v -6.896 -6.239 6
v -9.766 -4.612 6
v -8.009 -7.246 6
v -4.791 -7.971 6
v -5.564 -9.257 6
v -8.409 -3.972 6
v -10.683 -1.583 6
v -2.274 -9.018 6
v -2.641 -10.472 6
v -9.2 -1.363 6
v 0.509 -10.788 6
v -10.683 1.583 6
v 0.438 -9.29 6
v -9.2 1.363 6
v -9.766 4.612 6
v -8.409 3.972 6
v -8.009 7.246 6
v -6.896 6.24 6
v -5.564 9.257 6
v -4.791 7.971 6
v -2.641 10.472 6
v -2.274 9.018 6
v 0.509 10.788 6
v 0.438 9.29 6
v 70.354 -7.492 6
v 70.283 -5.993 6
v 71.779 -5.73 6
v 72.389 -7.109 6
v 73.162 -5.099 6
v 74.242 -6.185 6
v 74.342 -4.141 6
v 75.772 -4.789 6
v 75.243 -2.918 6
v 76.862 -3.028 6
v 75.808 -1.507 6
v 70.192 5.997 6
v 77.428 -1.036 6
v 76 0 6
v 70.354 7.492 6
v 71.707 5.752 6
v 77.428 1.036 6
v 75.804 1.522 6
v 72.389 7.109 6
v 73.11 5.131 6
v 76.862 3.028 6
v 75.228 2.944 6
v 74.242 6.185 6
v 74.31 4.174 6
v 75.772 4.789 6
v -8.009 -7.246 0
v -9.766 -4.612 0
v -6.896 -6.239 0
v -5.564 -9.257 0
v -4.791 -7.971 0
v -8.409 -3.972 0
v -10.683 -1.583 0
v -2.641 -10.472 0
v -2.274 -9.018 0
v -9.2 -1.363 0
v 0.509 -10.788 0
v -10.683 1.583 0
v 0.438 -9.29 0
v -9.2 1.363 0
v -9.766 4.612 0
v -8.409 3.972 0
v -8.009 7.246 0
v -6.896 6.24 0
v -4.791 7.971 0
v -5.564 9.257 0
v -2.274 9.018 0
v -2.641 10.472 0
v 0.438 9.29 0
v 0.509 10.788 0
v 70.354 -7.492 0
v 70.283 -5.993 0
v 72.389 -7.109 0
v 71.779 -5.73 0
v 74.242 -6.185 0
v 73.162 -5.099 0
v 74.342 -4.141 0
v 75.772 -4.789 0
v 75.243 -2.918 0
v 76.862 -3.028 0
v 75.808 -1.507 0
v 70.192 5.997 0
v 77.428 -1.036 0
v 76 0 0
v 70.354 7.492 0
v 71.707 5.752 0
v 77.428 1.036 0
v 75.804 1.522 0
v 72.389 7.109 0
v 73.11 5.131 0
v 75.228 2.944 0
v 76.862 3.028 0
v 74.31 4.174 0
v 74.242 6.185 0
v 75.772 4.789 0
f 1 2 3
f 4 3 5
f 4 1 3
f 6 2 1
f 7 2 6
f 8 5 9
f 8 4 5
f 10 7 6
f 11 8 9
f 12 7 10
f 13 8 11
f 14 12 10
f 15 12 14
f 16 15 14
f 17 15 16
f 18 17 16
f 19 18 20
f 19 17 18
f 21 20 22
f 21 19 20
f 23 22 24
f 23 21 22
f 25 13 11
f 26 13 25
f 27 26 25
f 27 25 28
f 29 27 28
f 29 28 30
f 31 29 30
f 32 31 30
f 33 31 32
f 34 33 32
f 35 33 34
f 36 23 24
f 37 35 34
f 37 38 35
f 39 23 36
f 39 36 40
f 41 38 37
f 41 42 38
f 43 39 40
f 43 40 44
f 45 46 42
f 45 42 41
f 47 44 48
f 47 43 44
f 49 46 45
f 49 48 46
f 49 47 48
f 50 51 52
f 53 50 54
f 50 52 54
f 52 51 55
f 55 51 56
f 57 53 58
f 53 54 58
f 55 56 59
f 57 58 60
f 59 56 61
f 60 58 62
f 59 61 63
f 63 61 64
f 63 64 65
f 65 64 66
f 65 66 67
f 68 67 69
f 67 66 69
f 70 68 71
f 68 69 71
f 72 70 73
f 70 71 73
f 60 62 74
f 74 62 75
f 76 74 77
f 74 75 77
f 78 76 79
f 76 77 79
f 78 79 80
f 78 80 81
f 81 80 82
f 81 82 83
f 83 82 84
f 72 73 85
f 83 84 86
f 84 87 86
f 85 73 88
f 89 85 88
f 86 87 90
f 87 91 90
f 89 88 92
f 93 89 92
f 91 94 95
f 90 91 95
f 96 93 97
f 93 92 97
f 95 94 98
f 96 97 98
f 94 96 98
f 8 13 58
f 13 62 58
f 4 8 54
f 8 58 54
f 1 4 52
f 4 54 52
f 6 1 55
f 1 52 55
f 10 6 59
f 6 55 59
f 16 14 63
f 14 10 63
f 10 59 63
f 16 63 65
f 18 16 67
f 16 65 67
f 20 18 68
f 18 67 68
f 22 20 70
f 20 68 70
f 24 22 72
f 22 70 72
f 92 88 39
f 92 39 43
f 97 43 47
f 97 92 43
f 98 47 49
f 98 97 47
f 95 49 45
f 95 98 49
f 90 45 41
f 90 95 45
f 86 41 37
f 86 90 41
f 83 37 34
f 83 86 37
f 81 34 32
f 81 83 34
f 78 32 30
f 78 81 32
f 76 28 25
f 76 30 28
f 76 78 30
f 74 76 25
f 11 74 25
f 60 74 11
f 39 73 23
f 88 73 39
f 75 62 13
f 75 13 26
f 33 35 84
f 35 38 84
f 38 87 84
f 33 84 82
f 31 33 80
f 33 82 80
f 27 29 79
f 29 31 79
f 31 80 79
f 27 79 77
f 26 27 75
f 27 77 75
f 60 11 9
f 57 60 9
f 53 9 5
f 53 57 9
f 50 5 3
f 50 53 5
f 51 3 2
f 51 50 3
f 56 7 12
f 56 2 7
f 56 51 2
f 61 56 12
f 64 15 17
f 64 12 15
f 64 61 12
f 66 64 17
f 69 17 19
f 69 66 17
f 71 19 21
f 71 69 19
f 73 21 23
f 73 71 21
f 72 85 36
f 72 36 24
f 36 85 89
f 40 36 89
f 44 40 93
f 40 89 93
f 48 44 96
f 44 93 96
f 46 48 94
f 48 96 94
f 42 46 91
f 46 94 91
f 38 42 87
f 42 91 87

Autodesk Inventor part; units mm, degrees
ref_plane "YZ Plane" through (0, 0, 0) normal (1, 0, 0) x (0, 1, 0)
ref_plane "XZ Plane" through (0, 0, 0) normal (0, 1, 0) x (-1, 0, 0)
ref_plane "XY Plane" through (0, 0, 0) normal (0, 0, 1) x (1, 0, 0)
sketch "スケッチ1" plane through (0, 0, 0) normal (0, 0, 1) x (1, 0, 0)
  arc A0 (0.4385, 9.2897) -> (0.4384, -9.2897) centre (0, 0) ccw
  arc A1 (0.5091, 10.788) -> (0.5091, -10.788) centre (0, 0) ccw
  arc A2 (70.3536, -7.4917) -> (70.3536, 7.4917) centre (70, 0) ccw
  line L0 (0.5091, 10.788) -> (70.3536, 7.4917)
  line L1 (70.3536, -7.4917) -> (0.5091, -10.788)
  line L2 (70.1922, 5.9969) -> (0.4385, 9.2897)
  circle A3 centre (70, 0) radius 6
  line L3 (0.4384, -9.2897) -> (70.2829, -5.9933)
  point P0 (1.0111, -13.9634)
  point P1 (90.5417, -7.4804)
  point P2 (90.5417, 7.4804)
  point P3 (1.0111, 13.9634)
  point P4 (0.9028, 12.4674)
  dimension "d0" = 18.6
  dimension "d2" = 70
  dimension "d3" = 1.5
  dimension "d7" = 12
  dimension "d8" = 1.5
extrude "押し出し1" add sketch "スケッチ1" along normal blind 6
properties part number "Bed_Unit_Belt" material "ゴム"
